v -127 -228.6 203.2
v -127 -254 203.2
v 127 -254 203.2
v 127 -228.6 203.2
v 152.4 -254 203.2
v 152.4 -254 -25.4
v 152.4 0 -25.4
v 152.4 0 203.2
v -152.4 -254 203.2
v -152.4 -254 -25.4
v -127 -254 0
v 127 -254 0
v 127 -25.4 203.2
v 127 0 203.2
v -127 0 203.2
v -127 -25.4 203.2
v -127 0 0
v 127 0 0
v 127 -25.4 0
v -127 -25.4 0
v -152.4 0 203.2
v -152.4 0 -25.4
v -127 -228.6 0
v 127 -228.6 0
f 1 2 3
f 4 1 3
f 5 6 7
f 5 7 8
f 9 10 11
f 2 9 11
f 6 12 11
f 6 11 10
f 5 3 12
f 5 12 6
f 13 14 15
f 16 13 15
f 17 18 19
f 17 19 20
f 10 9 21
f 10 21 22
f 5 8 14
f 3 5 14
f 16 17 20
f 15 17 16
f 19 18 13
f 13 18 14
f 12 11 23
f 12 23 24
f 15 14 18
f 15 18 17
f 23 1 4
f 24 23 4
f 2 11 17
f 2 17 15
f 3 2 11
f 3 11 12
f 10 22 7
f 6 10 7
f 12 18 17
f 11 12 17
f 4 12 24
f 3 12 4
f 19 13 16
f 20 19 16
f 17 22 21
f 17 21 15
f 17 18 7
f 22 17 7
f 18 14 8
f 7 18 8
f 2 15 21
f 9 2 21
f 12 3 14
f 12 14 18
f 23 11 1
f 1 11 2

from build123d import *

# Parameters (mm, degrees)
F1_DEPTH = 254
F2_W     = 254
F2_H     = 203.2
F3_DEPTH = 25.4
F4_W     = 254
F4_H     = 203.2
F5_DEPTH = 25.4


with BuildPart() as f1:
    # F0 (on Front) → F1 (new body)
    with BuildSketch(Plane.XZ):
        Polygon((127, 0), (0, 0), (-127, 0), (-127, 203.2), (-152.4, 203.2), (-152.4, -25.4), (152.4, -25.4), (152.4, 203.2), (127, 203.2), align=None)
    extrude(amount=F1_DEPTH)


with BuildPart() as f3:
    # F2 (on face) → F3 (new body)
    with BuildSketch(Plane.XZ.offset(254)):
        with Locations((0, 101.6)):
            Rectangle(F2_W, F2_H)
    extrude(amount=-F3_DEPTH)


with BuildPart() as f5:
    # F4 (on face) → F5 (new body)
    with BuildSketch(Plane(origin=(0, 0, 0), x_dir=(-1, 0, 0), z_dir=(0, 1, 0))):
        with Locations((0, 101.6)):
            Rectangle(F4_W, F4_H)
    extrude(amount=-F5_DEPTH)


solid = Compound([f1.part, f3.part, f5.part])
